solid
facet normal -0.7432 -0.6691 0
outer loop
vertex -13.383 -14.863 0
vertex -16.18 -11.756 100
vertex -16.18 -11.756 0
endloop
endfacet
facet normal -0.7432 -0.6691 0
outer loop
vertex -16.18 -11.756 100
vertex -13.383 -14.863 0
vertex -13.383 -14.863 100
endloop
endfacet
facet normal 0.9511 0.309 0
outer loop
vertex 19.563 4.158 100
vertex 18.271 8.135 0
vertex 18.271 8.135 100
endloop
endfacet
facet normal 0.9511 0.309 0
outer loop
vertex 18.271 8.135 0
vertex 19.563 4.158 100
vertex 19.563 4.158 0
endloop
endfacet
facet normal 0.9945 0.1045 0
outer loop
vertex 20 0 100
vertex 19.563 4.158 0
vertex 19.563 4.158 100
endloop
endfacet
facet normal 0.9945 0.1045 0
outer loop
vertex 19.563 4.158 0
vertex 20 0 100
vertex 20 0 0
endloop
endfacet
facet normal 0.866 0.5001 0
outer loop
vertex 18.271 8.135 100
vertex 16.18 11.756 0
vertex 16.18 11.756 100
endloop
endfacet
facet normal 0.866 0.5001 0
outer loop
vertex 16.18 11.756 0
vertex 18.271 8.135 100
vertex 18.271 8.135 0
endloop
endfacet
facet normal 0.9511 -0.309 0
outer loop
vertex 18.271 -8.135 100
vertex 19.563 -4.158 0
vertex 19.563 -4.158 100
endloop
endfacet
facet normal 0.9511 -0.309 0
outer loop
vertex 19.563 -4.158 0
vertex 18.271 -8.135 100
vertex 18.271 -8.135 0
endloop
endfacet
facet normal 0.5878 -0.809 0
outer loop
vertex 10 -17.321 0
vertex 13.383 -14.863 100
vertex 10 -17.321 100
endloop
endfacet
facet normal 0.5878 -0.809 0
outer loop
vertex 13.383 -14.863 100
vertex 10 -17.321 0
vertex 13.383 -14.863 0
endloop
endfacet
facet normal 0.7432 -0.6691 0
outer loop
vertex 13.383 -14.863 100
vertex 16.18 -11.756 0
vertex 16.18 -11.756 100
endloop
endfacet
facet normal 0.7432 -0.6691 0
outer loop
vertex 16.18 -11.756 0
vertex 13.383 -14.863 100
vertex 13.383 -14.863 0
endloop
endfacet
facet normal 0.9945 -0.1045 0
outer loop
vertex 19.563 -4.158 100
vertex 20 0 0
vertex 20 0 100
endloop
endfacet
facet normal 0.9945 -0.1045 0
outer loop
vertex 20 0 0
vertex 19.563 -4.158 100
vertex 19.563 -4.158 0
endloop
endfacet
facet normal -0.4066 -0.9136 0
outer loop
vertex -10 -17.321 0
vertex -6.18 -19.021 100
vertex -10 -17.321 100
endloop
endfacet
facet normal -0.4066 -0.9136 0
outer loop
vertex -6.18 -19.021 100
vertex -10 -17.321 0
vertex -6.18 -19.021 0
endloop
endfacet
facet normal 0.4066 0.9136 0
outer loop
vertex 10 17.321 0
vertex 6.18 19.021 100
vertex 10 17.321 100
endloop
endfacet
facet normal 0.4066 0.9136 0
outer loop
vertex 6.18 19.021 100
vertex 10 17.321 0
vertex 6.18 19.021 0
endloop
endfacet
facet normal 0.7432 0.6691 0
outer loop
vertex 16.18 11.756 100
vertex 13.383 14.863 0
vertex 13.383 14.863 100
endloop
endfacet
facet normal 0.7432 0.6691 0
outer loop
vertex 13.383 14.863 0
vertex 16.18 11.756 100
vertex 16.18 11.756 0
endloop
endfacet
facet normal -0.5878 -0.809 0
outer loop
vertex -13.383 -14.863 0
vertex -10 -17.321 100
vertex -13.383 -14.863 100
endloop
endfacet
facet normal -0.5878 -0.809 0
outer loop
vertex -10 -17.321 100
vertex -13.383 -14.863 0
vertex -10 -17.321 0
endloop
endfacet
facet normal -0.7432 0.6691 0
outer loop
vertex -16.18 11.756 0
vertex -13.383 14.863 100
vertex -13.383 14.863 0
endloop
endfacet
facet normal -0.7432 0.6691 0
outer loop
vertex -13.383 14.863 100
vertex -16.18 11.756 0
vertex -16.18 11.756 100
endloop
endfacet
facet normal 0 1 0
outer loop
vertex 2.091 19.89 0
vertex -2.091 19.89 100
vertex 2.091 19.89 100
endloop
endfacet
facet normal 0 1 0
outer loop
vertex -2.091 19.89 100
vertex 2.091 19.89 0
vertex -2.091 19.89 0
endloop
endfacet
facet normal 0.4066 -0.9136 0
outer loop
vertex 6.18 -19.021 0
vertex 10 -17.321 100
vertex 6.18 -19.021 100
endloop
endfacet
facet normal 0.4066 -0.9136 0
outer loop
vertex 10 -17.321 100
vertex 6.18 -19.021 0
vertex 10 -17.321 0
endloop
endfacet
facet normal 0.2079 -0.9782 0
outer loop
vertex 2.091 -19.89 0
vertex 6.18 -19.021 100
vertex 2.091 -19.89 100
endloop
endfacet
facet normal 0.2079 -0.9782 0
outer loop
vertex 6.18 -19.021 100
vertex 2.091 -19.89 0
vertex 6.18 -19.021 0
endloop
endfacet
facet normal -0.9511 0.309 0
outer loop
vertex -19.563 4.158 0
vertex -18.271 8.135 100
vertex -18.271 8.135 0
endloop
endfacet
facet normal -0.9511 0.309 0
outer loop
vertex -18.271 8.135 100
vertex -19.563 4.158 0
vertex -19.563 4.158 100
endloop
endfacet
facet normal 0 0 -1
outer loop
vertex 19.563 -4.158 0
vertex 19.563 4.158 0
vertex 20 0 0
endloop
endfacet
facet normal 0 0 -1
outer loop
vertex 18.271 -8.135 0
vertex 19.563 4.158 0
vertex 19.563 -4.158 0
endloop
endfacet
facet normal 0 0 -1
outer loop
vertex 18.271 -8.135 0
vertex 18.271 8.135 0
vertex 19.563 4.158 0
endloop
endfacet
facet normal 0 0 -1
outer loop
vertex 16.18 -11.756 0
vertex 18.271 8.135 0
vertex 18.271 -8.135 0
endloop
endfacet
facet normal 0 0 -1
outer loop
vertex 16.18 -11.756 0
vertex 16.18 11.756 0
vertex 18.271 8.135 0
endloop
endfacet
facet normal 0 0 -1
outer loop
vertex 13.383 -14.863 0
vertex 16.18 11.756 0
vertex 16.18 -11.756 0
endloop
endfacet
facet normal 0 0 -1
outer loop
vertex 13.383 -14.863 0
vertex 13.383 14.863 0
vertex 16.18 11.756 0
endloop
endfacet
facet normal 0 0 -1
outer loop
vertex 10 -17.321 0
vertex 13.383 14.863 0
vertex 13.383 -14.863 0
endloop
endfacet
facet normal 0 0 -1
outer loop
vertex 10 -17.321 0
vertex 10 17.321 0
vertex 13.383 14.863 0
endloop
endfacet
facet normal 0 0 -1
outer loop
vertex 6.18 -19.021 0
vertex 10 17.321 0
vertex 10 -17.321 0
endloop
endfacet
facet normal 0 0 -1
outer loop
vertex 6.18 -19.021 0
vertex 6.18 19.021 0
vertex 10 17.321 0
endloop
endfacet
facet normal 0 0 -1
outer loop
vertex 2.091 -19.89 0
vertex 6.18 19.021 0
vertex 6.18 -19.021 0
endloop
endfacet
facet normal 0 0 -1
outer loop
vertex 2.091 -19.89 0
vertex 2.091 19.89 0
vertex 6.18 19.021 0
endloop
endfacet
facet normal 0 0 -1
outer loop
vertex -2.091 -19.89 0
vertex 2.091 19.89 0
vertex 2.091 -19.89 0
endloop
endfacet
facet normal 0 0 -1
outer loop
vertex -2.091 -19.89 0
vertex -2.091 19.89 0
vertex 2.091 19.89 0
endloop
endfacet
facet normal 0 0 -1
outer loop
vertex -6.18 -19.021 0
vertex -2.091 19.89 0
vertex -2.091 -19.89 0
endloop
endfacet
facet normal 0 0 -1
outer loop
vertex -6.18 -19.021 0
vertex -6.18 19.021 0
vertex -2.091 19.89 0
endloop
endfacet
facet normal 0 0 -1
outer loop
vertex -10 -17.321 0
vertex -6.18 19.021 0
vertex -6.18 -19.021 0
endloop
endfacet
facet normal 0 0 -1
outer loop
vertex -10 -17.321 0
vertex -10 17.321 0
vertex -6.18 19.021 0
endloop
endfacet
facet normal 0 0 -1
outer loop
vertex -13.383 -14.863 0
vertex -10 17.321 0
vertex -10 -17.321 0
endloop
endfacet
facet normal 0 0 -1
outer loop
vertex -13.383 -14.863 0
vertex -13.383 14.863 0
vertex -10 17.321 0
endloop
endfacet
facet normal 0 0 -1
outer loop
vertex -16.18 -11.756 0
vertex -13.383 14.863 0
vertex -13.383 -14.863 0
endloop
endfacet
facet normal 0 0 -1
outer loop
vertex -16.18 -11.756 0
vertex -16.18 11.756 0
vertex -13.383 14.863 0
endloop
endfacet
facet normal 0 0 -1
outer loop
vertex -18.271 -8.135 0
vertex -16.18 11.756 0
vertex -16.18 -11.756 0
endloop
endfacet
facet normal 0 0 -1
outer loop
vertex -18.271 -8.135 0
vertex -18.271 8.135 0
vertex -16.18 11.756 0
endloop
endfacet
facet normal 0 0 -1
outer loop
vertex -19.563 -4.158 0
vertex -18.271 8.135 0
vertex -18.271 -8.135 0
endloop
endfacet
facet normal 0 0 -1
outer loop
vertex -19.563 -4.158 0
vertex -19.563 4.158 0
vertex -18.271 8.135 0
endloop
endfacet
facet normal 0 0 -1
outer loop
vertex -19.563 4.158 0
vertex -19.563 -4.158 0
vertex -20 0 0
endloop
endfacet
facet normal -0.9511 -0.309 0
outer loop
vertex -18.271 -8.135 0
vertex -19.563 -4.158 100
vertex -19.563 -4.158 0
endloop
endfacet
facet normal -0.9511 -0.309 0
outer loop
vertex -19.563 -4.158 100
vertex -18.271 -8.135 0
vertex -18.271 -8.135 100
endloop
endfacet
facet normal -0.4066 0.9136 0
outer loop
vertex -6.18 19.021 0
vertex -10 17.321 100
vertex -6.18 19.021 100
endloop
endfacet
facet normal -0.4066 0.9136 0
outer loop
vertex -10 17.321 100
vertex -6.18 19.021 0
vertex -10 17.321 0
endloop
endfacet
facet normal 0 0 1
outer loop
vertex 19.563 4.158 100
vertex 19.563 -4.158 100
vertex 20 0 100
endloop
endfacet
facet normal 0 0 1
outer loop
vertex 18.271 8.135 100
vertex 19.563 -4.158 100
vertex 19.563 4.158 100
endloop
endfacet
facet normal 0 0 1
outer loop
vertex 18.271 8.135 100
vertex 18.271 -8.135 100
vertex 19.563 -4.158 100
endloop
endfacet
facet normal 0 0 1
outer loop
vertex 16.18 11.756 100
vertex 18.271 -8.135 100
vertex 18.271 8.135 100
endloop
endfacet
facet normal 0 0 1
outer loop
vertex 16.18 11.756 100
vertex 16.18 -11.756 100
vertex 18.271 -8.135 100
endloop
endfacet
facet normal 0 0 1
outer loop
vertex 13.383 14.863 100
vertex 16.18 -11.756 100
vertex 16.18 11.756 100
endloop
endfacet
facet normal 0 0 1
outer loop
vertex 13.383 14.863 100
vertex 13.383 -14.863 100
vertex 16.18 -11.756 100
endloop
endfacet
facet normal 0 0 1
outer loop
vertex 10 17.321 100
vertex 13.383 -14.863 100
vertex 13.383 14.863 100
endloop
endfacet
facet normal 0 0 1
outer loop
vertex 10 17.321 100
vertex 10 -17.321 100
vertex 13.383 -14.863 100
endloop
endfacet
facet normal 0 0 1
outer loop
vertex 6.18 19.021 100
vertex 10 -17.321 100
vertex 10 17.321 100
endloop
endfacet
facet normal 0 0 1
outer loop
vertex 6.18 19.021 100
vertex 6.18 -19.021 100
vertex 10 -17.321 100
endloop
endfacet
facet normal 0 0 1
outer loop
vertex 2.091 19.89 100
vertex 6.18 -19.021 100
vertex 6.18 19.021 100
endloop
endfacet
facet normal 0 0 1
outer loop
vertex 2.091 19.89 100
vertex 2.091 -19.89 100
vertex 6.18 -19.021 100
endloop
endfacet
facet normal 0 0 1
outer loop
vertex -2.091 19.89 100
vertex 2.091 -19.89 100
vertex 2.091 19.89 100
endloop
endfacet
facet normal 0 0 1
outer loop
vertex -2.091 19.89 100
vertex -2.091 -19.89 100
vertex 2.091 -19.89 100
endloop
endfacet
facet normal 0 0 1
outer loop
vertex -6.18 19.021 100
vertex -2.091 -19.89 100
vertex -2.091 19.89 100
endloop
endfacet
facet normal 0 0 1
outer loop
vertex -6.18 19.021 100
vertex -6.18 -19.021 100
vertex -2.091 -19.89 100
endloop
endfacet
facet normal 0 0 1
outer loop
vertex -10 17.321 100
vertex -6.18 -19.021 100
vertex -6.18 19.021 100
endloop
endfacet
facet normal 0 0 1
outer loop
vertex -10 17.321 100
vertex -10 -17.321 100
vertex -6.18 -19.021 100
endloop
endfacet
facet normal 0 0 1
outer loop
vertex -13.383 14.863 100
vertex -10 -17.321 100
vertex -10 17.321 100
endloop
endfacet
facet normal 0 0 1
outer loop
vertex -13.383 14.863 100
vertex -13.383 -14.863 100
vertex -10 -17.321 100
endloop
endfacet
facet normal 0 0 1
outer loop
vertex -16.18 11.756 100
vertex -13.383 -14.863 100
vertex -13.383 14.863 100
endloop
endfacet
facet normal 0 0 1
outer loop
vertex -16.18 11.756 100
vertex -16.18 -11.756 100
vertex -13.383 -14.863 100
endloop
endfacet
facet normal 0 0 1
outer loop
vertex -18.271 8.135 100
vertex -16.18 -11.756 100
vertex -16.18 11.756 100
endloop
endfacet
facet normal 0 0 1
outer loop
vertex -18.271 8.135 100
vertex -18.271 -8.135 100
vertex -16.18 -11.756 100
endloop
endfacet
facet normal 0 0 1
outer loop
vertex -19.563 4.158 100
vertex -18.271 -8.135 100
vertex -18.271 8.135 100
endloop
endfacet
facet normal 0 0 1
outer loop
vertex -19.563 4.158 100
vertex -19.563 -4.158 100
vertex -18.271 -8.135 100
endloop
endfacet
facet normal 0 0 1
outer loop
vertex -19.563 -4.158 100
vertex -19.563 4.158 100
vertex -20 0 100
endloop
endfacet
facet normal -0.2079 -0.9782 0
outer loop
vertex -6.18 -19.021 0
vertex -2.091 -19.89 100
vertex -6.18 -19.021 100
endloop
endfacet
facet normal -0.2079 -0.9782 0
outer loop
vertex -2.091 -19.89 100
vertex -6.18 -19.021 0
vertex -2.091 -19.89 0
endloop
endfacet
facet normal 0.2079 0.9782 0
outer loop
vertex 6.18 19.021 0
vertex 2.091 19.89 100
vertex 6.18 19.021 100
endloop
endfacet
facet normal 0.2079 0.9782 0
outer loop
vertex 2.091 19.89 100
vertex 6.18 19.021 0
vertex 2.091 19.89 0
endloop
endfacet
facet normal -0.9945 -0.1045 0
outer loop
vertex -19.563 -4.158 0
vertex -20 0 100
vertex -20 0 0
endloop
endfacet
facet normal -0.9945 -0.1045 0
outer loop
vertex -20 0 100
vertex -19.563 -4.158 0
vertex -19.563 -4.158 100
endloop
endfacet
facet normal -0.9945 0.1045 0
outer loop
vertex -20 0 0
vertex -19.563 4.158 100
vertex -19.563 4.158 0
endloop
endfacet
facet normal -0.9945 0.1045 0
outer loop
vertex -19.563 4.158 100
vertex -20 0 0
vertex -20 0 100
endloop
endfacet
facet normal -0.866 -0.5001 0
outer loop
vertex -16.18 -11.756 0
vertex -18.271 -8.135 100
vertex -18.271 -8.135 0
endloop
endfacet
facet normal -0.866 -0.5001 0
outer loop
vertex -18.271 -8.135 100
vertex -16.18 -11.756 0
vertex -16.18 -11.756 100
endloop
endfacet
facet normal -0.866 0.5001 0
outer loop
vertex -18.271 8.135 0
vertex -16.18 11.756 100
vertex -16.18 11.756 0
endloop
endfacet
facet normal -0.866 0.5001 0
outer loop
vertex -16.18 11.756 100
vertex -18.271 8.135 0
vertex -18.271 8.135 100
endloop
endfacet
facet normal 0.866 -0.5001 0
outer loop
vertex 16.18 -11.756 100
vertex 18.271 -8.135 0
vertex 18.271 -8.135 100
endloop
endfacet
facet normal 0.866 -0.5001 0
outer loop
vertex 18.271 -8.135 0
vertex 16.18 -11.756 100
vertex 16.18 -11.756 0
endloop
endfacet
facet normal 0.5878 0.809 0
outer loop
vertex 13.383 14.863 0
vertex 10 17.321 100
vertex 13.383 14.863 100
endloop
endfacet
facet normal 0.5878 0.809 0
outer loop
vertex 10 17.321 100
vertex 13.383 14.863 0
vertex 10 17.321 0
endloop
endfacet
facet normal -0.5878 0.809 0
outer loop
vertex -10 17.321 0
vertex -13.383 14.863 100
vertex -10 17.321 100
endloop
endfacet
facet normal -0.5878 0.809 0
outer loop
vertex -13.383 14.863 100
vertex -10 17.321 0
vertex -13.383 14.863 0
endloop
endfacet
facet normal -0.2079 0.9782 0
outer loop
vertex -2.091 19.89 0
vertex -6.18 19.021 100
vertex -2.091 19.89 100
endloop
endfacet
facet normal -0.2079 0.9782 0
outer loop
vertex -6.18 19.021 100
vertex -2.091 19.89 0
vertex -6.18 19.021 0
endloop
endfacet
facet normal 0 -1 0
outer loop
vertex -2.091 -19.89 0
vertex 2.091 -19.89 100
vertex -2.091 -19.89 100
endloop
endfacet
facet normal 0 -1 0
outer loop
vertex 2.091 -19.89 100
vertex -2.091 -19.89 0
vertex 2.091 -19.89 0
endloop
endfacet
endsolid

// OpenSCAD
cylinder(h = 100, d = 40);
translate([0, 0, 100 * $t]) cylinder(h = 100, d = 18);
